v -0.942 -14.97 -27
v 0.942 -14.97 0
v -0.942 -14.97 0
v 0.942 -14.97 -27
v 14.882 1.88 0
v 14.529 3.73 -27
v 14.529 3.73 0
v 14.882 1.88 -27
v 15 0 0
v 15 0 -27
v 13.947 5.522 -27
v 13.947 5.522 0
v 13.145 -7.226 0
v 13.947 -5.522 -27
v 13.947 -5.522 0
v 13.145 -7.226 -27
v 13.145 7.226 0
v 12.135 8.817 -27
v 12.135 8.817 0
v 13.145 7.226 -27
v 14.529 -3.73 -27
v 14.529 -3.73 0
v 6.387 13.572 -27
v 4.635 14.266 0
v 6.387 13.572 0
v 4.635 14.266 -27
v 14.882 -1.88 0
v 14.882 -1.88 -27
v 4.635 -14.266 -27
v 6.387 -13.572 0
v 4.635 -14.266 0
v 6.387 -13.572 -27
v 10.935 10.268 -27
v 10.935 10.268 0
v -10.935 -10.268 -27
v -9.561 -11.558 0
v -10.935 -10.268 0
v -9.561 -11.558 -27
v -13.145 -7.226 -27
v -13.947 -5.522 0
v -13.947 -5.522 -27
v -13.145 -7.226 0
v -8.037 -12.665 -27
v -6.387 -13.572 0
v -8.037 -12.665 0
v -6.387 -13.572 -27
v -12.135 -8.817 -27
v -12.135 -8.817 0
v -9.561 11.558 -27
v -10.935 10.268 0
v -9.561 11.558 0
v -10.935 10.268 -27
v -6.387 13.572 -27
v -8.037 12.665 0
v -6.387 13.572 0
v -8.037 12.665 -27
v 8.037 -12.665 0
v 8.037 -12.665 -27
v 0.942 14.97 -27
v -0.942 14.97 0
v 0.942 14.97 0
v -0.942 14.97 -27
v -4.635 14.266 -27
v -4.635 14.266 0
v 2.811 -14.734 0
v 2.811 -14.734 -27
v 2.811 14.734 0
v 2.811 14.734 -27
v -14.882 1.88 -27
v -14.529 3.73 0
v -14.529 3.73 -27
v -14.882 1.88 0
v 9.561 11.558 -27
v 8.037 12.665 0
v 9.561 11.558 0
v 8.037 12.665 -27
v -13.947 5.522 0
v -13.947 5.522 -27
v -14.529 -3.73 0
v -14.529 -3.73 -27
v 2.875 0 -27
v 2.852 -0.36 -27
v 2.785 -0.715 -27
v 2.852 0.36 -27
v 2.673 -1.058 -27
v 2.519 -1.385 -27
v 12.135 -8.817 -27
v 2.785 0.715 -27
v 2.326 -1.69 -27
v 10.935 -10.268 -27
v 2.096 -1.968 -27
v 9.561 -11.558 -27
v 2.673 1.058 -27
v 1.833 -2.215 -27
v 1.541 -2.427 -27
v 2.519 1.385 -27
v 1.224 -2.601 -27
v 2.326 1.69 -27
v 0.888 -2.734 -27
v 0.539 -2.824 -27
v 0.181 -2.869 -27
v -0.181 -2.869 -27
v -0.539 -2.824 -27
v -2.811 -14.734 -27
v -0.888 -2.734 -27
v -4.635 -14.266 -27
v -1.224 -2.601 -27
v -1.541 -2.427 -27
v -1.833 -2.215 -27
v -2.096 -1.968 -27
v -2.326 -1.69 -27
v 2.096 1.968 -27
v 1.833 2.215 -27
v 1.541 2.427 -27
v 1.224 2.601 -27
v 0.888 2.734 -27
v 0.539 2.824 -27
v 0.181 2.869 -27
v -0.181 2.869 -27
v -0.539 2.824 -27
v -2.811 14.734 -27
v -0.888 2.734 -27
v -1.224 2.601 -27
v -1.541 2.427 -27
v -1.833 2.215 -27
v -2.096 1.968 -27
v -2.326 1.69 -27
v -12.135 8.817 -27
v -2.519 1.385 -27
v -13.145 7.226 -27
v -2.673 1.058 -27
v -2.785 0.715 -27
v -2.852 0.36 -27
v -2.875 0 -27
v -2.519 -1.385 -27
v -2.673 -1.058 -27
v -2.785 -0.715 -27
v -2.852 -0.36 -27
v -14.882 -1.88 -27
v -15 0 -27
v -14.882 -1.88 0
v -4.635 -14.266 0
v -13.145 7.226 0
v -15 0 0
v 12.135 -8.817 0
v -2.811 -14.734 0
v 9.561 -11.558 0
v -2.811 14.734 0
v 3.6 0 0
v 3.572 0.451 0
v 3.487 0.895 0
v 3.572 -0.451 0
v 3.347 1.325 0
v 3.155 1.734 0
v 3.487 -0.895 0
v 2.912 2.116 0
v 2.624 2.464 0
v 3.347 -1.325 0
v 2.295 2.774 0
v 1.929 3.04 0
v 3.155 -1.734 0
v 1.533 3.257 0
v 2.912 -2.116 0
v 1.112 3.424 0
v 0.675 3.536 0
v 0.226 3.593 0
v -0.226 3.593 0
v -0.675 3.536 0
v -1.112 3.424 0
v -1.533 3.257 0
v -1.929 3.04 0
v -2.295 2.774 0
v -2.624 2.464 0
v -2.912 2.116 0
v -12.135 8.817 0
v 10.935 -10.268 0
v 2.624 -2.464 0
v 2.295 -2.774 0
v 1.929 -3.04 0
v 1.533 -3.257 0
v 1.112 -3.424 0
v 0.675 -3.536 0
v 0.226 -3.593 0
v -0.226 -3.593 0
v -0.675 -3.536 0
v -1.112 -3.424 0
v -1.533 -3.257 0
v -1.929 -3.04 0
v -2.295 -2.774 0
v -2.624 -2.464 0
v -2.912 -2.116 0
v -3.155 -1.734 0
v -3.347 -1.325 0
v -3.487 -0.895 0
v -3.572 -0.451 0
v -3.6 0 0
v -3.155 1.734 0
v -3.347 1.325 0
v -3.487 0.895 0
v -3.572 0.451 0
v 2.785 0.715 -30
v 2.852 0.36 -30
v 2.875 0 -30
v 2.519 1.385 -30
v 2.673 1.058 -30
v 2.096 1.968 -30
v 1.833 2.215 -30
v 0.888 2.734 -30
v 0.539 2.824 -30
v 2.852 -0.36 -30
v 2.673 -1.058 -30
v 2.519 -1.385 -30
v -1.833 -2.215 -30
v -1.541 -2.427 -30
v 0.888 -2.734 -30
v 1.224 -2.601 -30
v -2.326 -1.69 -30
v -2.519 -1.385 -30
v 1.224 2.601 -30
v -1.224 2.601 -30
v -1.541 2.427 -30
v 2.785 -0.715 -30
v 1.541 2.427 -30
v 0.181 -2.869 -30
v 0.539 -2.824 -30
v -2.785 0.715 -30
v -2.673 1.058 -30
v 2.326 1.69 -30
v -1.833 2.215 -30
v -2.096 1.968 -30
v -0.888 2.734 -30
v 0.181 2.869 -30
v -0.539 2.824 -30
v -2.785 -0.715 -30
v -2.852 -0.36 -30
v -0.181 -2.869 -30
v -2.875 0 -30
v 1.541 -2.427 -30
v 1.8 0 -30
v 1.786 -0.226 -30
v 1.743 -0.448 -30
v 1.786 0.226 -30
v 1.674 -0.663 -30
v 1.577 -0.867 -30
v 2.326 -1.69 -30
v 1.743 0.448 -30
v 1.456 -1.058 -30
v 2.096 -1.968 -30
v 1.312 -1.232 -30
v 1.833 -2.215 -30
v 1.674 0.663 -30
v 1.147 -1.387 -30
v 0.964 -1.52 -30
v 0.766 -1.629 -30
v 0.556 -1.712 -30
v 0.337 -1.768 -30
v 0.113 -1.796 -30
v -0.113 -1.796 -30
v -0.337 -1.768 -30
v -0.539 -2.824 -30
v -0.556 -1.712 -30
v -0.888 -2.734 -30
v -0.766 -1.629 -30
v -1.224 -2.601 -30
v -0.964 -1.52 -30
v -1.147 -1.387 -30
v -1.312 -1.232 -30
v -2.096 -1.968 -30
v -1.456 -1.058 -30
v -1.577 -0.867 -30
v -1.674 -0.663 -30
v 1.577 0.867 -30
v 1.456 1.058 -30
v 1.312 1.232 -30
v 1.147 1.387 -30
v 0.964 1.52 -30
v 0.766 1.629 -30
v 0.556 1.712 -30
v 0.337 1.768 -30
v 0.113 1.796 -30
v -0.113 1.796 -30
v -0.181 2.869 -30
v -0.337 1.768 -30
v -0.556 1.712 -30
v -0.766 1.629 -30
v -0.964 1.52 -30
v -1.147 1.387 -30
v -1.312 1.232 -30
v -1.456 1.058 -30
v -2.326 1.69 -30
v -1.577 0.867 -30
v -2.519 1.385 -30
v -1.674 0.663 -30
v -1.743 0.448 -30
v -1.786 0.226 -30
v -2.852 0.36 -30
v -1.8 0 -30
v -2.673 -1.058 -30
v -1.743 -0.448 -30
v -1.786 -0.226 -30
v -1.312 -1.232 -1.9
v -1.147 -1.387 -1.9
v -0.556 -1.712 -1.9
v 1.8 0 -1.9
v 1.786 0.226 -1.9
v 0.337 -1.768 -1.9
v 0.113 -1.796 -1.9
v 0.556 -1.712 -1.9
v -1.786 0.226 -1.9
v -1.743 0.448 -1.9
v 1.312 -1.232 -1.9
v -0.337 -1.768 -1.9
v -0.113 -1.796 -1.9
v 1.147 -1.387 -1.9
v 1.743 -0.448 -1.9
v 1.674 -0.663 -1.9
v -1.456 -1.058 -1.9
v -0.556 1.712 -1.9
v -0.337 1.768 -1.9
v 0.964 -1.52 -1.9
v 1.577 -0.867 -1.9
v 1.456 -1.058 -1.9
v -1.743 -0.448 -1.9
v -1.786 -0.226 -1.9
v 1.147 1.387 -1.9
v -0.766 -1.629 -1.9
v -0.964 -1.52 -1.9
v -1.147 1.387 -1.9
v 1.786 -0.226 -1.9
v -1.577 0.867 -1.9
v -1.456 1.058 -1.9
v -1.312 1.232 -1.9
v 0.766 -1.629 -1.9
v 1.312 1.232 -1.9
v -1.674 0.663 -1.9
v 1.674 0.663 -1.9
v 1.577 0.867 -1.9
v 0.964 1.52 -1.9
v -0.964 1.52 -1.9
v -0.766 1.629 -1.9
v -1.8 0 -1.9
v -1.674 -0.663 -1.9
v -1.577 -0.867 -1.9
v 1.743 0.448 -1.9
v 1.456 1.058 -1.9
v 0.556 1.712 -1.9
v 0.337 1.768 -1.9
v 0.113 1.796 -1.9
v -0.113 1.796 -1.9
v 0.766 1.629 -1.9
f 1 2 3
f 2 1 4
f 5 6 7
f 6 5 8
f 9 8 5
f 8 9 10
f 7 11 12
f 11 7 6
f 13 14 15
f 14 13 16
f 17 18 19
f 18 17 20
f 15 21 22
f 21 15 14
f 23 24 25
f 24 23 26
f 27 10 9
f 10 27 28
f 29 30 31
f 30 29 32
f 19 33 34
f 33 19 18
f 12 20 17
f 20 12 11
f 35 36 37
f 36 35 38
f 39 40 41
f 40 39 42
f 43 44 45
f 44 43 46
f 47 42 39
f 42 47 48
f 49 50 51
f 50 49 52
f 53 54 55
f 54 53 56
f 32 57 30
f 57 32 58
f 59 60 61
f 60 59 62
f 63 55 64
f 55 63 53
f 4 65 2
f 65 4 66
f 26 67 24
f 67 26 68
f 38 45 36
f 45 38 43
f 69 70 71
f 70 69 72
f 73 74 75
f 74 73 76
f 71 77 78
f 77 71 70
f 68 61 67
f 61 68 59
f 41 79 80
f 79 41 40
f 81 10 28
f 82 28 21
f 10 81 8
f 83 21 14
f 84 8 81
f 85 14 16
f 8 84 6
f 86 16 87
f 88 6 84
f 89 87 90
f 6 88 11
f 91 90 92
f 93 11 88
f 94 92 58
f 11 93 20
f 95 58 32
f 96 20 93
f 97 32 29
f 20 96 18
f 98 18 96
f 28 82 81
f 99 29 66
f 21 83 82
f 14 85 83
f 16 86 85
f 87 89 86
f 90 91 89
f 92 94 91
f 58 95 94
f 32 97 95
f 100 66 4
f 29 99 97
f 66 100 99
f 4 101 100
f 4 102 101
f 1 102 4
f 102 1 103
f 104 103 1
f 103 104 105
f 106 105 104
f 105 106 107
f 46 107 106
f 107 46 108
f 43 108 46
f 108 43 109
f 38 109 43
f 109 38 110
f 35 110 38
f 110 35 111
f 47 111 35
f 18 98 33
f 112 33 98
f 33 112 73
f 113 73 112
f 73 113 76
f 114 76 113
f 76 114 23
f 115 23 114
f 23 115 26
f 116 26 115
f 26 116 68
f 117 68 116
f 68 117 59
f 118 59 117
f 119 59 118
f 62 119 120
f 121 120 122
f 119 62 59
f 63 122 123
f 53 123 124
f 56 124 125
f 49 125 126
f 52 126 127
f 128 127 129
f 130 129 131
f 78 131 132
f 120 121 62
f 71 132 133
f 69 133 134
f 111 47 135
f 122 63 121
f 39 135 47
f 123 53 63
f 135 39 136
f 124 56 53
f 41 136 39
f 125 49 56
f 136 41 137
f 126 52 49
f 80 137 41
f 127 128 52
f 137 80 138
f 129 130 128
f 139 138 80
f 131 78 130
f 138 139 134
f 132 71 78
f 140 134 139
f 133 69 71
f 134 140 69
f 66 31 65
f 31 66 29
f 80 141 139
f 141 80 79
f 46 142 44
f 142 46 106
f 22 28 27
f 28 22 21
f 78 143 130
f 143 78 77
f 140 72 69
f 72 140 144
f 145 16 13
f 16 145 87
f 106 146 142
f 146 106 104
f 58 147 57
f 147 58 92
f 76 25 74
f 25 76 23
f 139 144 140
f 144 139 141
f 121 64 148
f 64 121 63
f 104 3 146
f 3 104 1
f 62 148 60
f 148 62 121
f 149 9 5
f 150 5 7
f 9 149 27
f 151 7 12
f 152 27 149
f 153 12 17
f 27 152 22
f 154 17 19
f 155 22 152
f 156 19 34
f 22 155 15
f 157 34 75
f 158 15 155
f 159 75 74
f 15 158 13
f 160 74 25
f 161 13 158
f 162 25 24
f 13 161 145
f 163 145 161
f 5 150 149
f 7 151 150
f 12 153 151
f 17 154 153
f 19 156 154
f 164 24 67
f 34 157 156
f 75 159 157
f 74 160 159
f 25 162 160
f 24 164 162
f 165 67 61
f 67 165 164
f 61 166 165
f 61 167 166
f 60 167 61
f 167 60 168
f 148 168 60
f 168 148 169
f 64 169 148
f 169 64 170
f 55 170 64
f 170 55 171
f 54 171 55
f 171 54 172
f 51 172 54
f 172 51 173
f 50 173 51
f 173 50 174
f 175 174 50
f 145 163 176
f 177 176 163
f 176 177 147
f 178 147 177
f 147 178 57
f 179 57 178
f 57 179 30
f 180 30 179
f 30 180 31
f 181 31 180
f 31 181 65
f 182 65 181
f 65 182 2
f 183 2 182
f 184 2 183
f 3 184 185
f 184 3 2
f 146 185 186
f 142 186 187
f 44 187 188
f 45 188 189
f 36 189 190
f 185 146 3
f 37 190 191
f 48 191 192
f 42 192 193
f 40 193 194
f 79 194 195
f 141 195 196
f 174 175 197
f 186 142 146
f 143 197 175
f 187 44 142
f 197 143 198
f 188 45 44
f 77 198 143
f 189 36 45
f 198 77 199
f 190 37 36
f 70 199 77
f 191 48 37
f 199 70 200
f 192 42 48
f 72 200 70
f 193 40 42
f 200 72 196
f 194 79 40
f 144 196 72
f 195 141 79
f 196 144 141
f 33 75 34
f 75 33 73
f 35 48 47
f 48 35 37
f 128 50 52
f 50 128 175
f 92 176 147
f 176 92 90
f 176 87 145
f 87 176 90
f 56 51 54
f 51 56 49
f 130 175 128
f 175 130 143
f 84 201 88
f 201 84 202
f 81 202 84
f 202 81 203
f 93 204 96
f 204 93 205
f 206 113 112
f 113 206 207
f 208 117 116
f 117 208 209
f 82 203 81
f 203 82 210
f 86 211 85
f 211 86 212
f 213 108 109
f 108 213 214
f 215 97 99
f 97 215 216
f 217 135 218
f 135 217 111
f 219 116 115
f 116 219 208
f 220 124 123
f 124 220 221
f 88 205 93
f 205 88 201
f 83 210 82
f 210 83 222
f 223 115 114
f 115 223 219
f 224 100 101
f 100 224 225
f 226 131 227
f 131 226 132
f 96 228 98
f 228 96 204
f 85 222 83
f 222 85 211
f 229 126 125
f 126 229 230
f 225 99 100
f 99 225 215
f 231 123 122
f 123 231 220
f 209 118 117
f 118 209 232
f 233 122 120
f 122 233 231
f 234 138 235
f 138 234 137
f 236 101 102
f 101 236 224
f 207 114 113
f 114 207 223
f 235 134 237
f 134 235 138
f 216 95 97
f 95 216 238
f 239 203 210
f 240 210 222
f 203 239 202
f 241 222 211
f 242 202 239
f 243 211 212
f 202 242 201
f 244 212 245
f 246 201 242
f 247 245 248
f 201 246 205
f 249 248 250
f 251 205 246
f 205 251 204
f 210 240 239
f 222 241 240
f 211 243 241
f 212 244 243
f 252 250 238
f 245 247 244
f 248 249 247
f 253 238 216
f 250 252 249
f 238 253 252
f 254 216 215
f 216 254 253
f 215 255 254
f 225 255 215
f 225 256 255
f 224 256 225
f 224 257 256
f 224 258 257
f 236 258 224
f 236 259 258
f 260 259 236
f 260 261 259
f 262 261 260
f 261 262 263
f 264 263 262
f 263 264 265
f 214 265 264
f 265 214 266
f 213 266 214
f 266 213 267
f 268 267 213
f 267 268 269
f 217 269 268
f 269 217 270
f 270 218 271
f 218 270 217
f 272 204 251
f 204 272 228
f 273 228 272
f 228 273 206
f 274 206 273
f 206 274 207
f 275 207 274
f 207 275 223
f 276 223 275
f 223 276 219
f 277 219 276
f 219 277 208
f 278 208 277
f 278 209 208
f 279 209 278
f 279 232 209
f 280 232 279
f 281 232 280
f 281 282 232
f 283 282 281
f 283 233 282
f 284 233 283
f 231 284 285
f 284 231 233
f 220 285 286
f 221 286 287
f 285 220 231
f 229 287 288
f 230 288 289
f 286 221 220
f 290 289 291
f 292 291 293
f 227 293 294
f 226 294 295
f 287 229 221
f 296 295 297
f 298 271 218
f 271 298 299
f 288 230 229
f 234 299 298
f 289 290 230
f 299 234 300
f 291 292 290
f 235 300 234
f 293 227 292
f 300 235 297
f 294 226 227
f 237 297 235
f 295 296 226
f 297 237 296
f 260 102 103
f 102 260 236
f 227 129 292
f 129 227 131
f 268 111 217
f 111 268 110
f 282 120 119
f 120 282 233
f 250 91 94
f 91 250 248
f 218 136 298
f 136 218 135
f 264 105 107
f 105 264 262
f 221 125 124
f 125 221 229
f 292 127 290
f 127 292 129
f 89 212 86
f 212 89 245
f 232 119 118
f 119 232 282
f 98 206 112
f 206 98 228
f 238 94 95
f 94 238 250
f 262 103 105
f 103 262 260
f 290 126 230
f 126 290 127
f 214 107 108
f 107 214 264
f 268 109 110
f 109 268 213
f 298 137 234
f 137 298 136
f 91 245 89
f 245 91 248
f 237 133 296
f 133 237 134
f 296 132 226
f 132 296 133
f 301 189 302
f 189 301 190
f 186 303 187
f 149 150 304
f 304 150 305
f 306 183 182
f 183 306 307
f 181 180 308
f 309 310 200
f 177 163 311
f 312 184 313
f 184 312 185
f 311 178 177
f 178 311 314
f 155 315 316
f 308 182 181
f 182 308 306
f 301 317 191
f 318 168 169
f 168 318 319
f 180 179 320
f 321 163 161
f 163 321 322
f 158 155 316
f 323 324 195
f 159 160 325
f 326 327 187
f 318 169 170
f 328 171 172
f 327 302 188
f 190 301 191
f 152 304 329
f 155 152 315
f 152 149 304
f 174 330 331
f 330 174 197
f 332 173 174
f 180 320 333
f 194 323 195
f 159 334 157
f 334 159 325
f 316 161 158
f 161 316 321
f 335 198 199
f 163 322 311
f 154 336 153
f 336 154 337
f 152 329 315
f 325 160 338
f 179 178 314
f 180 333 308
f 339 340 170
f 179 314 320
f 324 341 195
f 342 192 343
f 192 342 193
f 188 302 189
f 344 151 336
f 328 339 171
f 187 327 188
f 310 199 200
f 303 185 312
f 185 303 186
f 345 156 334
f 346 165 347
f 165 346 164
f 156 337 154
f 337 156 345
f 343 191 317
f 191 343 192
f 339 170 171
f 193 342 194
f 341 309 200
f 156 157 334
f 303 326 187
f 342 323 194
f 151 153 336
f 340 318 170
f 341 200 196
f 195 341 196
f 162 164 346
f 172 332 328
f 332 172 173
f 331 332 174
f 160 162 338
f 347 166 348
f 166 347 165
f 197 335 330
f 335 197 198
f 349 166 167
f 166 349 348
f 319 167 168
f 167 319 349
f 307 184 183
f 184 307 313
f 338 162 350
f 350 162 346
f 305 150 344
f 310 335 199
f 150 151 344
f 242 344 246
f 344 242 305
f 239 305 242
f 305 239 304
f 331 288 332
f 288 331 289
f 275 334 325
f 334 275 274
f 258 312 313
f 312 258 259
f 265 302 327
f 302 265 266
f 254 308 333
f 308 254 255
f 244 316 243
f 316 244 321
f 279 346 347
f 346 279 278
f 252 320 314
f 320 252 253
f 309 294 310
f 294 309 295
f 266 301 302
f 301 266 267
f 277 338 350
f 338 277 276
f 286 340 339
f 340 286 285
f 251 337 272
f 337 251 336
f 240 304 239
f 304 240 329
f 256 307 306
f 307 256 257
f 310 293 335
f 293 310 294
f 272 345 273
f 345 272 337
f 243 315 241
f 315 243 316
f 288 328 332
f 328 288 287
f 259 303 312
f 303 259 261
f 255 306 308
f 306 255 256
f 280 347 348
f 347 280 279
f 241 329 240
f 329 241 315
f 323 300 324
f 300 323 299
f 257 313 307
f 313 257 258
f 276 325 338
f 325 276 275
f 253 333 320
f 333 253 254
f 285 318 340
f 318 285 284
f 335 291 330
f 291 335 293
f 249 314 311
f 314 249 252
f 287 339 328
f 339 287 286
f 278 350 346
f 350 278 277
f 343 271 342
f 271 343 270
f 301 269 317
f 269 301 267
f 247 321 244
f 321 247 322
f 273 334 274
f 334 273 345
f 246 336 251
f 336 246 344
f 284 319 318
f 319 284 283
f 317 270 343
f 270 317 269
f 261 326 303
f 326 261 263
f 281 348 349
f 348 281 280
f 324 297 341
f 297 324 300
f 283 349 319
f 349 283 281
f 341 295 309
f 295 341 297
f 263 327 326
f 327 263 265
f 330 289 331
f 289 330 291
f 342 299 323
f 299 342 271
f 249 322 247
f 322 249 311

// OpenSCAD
$fn = 50;


difference() {
	union() {
		translate(v = [0, 0, -27.0000000000]) {
			cylinder(h = 27, r = 15.0000000000);
		}
		#translate(v = [0, 0, -30.0000000000]) {
			cylinder(h = 30, r = 2.8750000000);
		}
	}
	union() {
		translate(v = [0, 0, 0]) {
			rotate(a = [0, 0, 0]) {
				difference() {
					union() {
						translate(v = [0, 0, -30.0000000000]) {
							cylinder(h = 30, r = 1.5000000000);
						}
						translate(v = [0, 0, -1.9000000000]) {
							cylinder(h = 1.9000000000, r1 = 1.8000000000, r2 = 3.6000000000);
						}
						translate(v = [0, 0, -30.0000000000]) {
							cylinder(h = 30, r = 1.8000000000);
						}
						translate(v = [0, 0, -30.0000000000]) {
							cylinder(h = 30, r = 1.5000000000);
						}
					}
					union();
				}
			}
		}
	}
}
